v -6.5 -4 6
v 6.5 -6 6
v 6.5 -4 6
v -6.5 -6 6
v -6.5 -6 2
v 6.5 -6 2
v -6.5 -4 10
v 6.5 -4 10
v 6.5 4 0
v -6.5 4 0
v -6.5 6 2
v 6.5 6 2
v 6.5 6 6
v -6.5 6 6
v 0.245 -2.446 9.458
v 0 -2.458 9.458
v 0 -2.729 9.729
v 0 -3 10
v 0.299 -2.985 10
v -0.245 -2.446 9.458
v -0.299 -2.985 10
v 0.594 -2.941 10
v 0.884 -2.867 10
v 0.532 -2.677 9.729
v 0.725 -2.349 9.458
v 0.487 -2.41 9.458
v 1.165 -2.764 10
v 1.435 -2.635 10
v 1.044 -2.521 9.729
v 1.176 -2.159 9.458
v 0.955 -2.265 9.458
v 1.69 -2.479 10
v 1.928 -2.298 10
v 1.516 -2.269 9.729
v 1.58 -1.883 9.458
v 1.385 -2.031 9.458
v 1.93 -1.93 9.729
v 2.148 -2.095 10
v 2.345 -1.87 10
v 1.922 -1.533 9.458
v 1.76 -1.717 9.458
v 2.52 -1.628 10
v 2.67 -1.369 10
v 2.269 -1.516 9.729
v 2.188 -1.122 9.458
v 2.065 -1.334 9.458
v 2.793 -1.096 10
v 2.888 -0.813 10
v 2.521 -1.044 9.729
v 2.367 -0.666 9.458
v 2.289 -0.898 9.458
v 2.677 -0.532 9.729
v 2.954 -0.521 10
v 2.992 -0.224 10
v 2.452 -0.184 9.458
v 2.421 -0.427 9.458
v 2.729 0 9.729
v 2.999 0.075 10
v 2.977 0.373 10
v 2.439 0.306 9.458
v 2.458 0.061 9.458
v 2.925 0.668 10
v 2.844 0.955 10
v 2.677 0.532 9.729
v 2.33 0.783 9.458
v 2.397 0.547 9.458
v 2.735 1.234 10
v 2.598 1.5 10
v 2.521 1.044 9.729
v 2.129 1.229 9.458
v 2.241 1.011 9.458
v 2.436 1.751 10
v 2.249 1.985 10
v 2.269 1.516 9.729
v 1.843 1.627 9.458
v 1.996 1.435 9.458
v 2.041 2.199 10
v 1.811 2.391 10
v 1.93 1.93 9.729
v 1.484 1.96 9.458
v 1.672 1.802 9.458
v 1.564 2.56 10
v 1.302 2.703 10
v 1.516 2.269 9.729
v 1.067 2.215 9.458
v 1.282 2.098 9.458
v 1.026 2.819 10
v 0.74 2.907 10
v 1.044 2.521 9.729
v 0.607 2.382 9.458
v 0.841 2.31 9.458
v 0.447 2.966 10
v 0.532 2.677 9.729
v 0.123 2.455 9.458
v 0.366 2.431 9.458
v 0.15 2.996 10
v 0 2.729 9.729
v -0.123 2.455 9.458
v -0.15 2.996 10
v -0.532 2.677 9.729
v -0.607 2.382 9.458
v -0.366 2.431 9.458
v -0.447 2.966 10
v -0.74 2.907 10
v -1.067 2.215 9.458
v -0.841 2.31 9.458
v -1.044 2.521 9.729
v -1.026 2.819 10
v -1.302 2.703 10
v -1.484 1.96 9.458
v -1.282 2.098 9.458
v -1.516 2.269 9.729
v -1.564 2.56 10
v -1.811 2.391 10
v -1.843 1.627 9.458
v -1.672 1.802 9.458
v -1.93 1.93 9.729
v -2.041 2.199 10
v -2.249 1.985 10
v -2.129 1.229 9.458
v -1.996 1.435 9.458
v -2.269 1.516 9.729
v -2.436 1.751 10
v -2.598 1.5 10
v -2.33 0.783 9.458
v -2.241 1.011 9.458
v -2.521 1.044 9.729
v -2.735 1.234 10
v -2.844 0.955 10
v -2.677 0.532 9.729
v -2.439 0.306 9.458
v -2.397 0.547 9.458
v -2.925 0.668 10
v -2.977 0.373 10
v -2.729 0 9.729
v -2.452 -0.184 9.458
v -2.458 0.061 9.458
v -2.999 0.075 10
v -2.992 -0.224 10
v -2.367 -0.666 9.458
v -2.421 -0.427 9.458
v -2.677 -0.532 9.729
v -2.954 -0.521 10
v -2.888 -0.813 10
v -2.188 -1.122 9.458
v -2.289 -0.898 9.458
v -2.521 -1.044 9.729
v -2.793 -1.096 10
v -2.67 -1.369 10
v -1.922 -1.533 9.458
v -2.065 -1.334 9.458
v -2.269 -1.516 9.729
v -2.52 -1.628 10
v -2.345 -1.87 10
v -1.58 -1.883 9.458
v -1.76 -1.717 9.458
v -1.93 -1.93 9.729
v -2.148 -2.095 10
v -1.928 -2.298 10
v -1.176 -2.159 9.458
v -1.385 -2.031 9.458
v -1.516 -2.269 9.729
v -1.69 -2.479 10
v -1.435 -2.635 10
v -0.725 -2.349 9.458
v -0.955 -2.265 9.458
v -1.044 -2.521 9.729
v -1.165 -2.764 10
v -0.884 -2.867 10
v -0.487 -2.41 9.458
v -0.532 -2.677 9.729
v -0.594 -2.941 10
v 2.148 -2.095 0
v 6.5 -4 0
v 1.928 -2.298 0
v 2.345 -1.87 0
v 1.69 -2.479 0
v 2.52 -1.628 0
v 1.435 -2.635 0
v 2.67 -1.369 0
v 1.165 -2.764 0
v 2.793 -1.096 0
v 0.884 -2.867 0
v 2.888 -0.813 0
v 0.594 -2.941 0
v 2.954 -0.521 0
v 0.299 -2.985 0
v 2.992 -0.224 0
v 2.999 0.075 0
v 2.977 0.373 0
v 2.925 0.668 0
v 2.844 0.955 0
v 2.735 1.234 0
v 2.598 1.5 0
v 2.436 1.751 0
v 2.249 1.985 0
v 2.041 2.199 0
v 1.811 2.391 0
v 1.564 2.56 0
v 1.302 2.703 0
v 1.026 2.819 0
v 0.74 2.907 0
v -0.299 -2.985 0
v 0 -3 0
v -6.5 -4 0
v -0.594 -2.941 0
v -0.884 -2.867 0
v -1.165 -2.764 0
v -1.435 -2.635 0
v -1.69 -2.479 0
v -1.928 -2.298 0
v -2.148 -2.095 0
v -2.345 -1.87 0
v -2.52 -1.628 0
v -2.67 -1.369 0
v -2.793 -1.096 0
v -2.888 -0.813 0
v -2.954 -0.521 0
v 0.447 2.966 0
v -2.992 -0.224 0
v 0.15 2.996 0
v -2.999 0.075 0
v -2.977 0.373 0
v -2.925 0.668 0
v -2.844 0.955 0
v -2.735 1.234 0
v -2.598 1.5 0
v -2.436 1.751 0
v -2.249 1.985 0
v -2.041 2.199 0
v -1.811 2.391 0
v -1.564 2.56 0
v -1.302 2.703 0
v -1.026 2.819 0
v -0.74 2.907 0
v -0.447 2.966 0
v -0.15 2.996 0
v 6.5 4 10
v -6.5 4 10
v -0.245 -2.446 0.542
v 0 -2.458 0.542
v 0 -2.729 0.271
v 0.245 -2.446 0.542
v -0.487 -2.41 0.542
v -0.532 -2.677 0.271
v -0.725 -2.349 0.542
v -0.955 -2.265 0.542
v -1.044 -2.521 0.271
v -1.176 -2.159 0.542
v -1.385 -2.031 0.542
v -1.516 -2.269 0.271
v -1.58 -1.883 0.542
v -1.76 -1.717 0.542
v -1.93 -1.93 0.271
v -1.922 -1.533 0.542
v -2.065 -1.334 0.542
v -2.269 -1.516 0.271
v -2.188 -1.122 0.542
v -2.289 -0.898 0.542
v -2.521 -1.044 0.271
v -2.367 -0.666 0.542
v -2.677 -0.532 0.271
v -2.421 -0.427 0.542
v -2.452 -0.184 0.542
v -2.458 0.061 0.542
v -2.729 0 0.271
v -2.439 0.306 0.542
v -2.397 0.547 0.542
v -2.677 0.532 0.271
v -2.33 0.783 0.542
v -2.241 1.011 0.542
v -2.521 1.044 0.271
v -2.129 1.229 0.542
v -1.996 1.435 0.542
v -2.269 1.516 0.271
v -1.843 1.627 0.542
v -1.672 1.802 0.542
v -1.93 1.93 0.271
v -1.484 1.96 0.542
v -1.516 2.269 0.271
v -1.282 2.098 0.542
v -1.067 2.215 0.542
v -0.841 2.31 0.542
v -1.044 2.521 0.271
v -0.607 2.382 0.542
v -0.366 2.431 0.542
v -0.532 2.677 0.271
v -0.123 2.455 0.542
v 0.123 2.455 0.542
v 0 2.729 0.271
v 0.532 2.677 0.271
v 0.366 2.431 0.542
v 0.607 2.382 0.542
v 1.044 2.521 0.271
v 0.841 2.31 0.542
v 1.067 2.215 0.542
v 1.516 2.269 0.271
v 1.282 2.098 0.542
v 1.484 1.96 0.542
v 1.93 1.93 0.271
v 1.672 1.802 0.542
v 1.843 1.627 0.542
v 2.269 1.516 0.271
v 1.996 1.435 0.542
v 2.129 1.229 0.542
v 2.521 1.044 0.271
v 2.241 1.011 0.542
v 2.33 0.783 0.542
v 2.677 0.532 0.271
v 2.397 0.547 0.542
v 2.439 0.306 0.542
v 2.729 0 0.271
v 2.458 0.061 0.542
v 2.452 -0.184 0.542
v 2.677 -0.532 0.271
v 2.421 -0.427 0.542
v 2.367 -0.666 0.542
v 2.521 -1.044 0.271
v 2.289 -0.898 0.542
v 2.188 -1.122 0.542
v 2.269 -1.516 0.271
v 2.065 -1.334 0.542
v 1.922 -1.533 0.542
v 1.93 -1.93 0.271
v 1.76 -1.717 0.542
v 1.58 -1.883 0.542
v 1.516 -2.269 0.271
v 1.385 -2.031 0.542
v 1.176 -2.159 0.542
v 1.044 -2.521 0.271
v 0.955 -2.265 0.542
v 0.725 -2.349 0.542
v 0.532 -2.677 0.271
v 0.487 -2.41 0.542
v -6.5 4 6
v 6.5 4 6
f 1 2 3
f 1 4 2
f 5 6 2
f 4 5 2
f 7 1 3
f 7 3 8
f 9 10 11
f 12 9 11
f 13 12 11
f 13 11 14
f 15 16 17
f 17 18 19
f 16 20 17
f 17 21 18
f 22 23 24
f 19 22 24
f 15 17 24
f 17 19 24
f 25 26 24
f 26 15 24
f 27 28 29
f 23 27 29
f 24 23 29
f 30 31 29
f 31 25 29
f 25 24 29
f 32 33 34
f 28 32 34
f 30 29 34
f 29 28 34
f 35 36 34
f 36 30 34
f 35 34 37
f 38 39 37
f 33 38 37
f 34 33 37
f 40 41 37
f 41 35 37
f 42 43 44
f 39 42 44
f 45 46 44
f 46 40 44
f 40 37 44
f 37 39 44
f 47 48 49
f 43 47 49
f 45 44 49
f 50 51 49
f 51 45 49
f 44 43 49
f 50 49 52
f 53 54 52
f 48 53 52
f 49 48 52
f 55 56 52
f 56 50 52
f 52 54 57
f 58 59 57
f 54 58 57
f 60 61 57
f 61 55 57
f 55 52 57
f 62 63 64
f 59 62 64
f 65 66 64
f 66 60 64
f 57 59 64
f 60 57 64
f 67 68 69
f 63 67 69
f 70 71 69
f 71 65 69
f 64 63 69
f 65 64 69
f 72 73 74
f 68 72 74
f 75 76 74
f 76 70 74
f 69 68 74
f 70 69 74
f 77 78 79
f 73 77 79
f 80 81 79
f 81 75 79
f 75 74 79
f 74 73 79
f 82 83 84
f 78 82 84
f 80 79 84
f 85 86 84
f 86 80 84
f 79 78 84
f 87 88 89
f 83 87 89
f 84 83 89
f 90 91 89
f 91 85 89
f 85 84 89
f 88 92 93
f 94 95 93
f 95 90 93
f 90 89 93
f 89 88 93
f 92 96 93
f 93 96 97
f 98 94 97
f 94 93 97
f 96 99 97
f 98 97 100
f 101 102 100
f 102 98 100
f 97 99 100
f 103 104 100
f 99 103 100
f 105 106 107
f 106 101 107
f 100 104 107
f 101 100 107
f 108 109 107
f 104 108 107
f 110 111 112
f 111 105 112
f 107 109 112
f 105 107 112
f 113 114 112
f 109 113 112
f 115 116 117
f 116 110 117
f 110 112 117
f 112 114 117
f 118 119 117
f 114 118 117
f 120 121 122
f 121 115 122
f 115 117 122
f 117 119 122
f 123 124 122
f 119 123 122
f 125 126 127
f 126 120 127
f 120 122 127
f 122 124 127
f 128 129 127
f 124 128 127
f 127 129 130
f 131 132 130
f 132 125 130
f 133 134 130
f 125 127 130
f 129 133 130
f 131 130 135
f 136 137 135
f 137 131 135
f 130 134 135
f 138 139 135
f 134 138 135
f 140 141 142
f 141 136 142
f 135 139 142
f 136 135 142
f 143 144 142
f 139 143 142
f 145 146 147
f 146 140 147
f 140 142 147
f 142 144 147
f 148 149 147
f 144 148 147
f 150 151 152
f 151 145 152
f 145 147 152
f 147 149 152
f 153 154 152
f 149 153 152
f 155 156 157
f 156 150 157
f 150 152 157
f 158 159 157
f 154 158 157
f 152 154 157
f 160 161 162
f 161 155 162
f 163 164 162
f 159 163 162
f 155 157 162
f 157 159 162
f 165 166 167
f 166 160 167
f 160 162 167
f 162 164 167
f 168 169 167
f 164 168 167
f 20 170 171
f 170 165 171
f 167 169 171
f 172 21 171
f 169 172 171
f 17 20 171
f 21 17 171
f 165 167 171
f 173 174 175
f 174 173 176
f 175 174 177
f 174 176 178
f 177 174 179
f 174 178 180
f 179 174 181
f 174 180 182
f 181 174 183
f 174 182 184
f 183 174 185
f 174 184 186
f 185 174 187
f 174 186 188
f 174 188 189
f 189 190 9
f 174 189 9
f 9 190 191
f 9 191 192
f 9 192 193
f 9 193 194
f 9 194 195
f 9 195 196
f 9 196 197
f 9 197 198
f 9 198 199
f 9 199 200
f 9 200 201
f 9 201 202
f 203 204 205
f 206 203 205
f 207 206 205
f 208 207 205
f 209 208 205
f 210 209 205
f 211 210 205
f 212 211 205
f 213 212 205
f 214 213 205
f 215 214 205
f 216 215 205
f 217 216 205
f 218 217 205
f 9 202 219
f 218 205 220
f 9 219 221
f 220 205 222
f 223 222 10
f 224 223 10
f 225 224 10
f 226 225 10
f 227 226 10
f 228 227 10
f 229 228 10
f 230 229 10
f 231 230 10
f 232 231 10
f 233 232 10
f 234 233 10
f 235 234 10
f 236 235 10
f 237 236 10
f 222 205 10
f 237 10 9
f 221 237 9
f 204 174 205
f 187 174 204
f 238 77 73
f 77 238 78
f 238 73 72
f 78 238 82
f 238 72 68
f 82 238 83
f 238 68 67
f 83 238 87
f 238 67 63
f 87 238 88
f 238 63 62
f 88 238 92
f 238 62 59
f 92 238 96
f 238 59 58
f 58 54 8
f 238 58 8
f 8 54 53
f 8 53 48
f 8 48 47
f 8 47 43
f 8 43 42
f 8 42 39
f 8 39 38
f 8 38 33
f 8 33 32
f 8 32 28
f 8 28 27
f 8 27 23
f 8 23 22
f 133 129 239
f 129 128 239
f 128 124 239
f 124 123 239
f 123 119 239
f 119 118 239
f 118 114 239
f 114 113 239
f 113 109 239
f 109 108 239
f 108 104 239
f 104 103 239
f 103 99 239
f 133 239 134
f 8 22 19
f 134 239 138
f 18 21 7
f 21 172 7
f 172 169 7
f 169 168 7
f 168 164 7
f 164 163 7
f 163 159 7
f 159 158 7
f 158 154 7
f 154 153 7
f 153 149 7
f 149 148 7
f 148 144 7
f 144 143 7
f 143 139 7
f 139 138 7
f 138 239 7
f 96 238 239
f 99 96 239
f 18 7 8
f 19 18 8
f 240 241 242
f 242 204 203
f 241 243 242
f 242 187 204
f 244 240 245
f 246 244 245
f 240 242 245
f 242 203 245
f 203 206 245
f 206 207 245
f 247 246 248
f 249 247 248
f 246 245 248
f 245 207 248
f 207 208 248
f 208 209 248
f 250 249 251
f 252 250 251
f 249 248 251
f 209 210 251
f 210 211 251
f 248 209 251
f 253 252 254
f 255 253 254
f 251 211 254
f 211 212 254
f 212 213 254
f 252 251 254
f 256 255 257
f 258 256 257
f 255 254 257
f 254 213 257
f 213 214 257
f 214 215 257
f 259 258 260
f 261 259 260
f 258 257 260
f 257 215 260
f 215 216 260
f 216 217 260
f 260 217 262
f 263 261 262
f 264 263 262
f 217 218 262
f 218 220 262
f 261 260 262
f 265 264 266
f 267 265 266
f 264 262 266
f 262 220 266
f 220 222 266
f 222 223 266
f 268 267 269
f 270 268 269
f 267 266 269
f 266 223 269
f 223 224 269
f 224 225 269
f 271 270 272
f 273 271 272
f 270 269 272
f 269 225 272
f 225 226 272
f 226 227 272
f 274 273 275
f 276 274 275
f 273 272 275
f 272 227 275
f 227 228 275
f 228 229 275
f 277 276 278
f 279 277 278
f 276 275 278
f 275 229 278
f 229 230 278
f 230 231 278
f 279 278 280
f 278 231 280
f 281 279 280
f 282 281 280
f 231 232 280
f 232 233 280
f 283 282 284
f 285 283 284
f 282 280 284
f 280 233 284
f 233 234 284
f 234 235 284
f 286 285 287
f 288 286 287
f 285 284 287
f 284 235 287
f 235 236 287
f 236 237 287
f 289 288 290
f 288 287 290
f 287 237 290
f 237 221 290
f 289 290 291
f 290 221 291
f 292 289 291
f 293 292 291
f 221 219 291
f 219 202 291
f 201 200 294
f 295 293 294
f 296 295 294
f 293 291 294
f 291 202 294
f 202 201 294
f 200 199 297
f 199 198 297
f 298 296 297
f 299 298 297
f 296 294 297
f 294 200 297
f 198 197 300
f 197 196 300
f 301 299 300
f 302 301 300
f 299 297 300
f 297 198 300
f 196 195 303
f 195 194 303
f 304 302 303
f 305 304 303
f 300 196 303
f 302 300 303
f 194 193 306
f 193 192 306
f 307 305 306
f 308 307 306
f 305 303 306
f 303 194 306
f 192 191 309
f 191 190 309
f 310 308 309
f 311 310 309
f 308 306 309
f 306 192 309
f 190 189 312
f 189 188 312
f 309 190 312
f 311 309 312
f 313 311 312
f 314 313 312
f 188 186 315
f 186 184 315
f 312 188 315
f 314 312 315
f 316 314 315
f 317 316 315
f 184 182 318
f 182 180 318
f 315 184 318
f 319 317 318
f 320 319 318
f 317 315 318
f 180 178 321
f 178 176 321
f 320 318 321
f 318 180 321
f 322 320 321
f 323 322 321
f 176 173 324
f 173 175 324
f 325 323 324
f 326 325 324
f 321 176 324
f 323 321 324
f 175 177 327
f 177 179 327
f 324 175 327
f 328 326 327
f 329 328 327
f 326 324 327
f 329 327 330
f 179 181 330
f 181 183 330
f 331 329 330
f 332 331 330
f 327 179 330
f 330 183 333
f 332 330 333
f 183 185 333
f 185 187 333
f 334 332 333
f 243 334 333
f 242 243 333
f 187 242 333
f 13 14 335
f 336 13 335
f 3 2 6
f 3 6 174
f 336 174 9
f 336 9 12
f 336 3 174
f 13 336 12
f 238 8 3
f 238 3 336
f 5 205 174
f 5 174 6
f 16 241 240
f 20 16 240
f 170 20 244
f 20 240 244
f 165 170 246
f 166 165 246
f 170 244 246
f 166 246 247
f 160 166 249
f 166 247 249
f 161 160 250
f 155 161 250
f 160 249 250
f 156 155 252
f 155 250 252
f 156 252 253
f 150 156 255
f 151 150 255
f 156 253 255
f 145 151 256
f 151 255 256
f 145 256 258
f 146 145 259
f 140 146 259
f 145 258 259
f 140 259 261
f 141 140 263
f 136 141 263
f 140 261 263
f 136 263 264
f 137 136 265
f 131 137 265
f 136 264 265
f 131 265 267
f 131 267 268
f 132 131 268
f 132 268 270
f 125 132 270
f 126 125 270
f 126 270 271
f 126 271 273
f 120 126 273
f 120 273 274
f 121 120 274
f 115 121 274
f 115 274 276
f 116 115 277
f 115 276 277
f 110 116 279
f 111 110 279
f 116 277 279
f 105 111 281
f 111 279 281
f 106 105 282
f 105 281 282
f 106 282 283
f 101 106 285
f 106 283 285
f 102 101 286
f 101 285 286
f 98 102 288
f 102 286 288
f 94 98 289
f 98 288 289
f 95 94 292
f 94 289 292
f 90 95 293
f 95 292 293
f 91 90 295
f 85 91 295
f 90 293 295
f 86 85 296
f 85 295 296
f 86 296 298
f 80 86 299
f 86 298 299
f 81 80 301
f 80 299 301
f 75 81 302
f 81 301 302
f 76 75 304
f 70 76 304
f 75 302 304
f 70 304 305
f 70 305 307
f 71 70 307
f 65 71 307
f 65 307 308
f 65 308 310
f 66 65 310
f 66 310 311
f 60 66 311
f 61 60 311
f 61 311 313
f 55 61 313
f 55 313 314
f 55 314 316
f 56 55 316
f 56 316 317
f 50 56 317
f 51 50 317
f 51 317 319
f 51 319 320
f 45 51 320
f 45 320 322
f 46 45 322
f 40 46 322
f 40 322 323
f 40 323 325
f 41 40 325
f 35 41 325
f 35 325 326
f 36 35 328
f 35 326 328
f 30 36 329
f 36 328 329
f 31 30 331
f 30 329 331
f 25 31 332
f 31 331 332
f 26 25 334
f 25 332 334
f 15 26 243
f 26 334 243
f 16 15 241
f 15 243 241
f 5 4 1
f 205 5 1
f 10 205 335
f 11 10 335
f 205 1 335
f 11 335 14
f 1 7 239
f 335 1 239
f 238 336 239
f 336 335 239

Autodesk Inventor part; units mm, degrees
ref_plane "YZ Plane" through (0, 0, 0) normal (1, 0, 0) x (0, 1, 0)
ref_plane "XZ Plane" through (0, 0, 0) normal (0, 1, 0) x (-1, 0, 0)
ref_plane "XY Plane" through (0, 0, 0) normal (0, 0, 1) x (1, 0, 0)
sketch "Sketch1" plane through (0, 0, 0) normal (1, 0, 0) x (0, 1, 0)
  line L0 (0, 0) -> (4, 0)
  line L1 (4, 0) -> (6, 2)
  line L2 (6, 2) -> (6, 6)
  line L3 (6, 6) -> (4, 6)
  line L4 (4, 6) -> (4, 10)
  line L5 (4, 10) -> (0, 10)
  line L6 (0, -2) -> (0, 12) projected
  line L7 (0, 0) -> (-4, 0)
  line L8 (-4, 0) -> (-6, 2)
  line L9 (-6, 2) -> (-6, 6)
  line L10 (-6, 6) -> (-4, 6)
  line L11 (-4, 6) -> (-4, 10)
  line L12 (-4, 10) -> (0, 10)
  dimension "d0" = 10
  dimension "d1" = 45
  dimension "d4" = 2
  dimension "d6" = 6
  dimension "d19" = 12
  dimension "d20" = 8
extrude "Extrusion1" add sketch "Sketch1" along normal mid plane 13
sketch "Sketch2" plane through (6.5, -4, 10) normal (0, 0, 1) x (0, 1, 0)
  point P0 (4, 6.5)
hole "Hole1" at (0, 0, 10) direction (0, 0, -1) diameter 4.917 end through all thread size "M6x1" class "6H" standard "ISO Metric profile"
chamfer "Chamfer1" distance 0.5415 angle 45 2 edges at (0, 2.4585, 10) (0, 2.4585, 0)
properties part number "T-Nutenstein 8 - M6" material "Steel"
